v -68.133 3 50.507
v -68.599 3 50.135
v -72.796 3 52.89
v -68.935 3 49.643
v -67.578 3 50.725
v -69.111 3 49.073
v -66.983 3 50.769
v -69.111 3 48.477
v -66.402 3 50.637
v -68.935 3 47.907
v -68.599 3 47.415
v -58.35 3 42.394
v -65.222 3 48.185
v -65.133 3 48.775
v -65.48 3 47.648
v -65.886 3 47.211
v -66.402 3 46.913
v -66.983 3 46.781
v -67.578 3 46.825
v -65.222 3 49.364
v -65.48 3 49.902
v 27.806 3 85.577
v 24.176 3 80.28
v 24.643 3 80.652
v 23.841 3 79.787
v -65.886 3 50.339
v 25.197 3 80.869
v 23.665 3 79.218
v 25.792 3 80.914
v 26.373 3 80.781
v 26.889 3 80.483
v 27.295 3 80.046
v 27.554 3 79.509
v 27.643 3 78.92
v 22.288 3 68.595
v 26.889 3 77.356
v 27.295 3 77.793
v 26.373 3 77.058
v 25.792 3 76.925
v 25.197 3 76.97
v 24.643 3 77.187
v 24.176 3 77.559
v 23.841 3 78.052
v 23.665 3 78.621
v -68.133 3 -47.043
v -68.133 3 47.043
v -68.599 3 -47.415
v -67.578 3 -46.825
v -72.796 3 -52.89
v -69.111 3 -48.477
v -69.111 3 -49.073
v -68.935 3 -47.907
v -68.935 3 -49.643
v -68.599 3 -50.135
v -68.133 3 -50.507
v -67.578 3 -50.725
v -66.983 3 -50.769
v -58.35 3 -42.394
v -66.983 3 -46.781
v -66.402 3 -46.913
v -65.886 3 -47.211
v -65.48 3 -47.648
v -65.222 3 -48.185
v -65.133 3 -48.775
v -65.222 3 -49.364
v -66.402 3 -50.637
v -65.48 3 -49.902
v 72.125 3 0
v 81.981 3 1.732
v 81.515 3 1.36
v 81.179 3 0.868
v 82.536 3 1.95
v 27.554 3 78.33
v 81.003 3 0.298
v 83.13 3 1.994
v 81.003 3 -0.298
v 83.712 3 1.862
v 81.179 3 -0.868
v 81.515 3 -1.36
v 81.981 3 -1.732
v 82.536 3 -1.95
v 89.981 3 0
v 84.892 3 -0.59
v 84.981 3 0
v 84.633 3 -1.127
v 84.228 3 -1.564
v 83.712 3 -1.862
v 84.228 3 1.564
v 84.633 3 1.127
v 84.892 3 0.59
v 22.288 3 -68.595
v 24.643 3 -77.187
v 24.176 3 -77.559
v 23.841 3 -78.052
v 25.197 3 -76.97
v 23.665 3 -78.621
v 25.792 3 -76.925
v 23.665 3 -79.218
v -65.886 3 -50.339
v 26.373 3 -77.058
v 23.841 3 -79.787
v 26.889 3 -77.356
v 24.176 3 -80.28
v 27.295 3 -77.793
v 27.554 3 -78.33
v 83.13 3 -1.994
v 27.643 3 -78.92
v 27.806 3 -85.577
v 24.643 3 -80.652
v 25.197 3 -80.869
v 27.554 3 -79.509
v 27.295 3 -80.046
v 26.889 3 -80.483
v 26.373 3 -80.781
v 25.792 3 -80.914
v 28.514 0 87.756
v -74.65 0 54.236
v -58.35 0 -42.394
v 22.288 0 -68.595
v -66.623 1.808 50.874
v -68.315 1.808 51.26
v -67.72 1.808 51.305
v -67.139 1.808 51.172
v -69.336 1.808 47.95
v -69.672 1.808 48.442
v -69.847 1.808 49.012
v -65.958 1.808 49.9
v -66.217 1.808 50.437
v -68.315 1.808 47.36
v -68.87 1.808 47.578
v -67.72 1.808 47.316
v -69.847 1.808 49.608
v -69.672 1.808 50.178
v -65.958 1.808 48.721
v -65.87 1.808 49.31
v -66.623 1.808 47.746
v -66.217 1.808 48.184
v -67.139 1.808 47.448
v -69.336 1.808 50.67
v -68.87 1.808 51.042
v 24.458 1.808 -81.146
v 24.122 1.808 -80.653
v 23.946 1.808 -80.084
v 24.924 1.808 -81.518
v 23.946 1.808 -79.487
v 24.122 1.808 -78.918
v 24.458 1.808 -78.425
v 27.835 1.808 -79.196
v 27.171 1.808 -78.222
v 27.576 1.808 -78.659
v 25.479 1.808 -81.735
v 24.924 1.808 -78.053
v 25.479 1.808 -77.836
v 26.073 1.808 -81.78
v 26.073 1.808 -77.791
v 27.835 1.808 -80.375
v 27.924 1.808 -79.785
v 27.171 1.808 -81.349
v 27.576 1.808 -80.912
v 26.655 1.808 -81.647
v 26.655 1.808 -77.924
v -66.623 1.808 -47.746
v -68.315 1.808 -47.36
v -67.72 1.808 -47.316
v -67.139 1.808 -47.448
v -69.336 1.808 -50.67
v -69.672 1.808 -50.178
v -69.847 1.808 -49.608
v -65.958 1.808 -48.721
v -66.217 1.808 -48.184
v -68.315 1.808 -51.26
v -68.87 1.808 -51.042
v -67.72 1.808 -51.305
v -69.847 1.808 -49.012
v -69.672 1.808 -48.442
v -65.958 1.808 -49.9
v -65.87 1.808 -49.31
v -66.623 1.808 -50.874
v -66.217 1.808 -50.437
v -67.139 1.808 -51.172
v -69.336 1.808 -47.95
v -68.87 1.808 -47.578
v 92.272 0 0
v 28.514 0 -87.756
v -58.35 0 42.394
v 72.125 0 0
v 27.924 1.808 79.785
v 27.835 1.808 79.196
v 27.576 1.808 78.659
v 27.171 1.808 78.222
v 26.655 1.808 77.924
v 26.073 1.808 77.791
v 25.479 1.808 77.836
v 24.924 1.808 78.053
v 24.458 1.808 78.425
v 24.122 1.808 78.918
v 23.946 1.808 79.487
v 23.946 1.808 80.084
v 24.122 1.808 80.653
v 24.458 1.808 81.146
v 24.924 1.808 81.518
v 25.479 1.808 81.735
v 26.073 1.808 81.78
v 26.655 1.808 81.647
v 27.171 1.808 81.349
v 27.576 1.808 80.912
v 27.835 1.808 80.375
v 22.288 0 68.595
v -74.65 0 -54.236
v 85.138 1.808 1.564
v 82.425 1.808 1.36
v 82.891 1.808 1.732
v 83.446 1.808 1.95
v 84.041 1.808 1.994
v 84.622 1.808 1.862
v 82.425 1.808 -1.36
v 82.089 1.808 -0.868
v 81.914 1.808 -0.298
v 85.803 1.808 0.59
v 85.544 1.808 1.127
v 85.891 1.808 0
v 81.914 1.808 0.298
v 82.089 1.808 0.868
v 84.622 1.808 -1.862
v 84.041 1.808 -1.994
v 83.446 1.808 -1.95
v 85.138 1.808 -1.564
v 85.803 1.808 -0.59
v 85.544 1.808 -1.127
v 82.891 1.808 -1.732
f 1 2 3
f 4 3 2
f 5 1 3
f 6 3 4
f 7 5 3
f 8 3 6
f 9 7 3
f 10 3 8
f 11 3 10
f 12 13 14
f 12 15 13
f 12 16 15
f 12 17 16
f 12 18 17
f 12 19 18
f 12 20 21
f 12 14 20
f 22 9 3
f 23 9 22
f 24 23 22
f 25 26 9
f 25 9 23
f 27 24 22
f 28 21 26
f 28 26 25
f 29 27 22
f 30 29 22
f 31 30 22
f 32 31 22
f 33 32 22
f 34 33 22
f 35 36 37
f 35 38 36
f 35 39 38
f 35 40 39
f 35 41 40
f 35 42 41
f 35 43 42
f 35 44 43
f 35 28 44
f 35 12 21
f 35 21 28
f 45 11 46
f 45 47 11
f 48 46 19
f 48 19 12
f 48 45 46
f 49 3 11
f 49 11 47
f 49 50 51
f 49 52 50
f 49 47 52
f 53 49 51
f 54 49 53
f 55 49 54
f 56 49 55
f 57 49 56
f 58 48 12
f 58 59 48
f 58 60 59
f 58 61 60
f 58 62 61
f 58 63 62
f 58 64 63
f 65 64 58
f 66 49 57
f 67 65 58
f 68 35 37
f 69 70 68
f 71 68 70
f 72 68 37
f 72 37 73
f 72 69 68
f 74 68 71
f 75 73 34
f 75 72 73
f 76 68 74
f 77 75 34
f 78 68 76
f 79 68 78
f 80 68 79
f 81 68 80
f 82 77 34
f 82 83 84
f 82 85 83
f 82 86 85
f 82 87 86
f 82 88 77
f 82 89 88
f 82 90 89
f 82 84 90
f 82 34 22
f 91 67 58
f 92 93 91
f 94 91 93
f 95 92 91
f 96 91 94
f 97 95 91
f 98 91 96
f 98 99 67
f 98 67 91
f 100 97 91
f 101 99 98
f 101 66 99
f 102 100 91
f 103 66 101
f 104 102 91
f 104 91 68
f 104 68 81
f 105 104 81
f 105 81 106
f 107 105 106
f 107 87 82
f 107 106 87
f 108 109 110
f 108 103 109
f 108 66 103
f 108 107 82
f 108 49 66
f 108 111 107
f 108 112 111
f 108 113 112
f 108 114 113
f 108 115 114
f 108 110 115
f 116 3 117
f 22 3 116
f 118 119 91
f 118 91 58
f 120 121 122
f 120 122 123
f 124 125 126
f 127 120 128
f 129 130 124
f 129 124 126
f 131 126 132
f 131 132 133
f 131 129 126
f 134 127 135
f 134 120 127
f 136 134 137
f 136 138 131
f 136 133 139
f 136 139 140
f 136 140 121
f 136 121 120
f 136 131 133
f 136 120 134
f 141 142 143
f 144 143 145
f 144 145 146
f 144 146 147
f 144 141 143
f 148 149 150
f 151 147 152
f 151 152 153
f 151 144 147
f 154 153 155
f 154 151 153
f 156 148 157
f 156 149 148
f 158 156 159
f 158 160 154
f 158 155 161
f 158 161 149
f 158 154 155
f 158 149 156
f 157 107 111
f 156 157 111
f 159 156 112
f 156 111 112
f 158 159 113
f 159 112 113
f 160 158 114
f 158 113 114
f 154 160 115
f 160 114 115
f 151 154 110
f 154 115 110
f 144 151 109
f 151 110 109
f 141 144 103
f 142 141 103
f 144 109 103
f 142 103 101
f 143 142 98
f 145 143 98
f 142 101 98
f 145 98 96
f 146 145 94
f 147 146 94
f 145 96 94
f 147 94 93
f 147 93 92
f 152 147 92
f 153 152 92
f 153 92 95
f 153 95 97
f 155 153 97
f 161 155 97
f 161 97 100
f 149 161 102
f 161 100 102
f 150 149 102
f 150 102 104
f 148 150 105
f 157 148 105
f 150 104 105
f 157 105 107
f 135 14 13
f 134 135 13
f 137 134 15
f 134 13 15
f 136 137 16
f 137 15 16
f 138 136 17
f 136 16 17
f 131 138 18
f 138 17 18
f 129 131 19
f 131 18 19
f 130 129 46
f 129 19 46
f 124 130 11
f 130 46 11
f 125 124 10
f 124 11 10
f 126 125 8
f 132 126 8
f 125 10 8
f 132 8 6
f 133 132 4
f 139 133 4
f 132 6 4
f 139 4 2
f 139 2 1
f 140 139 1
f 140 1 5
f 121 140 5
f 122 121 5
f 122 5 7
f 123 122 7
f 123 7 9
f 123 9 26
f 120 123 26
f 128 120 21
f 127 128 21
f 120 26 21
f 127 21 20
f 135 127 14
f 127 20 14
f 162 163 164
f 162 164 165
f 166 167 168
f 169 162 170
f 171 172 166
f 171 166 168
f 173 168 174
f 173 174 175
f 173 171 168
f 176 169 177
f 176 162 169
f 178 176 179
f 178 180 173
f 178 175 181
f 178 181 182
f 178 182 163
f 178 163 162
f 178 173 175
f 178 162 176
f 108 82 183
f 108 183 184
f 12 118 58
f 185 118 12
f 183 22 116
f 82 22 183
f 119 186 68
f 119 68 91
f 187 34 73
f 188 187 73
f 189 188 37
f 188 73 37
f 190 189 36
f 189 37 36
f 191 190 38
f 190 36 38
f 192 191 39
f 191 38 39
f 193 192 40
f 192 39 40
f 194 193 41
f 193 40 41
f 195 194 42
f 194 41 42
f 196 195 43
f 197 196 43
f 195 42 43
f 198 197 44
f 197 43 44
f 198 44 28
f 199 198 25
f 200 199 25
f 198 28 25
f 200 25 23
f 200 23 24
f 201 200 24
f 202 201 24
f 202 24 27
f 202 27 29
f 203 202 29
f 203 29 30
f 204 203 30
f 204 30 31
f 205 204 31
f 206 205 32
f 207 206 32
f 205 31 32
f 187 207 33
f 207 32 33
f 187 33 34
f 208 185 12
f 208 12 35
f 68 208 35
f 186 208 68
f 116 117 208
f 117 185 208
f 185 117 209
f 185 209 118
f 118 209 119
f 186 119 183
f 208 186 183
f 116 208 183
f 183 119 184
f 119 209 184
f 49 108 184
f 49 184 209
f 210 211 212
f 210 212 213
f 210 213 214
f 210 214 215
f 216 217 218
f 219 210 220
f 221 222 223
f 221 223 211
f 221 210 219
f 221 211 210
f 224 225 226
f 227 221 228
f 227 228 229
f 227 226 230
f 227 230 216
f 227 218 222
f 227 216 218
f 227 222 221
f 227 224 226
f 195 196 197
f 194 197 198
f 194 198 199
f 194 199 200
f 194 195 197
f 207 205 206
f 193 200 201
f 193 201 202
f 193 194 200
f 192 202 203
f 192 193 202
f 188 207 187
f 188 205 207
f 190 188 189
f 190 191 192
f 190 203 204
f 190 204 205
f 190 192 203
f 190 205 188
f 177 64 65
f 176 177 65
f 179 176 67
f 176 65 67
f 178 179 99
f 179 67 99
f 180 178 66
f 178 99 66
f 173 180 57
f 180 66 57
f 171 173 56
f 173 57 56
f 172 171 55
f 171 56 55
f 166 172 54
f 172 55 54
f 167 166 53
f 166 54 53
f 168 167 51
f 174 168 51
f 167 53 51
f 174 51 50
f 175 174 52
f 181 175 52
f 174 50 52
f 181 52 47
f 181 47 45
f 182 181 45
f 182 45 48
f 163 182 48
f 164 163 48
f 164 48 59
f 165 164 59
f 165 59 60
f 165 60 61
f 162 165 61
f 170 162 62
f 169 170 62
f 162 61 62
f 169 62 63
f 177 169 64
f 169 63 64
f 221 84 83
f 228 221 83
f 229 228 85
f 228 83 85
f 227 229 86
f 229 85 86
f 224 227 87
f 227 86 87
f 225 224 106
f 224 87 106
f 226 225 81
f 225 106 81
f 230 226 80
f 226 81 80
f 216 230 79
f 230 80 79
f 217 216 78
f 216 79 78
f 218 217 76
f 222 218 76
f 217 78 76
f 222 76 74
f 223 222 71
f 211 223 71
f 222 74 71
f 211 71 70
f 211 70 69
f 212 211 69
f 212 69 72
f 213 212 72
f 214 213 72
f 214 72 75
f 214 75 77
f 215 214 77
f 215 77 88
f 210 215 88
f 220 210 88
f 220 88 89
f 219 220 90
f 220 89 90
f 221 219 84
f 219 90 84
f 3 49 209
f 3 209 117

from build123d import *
from OCP.BRepFilletAPI import BRepFilletAPI_MakeChamfer

# Parameters (mm, degrees)
BOSS_EXTRUDE1_DEPTH = 3
CHAMFER1_SIZE       = 3
CHAMFER1_SIZE_2     = 1.853922924
CUT_EXTRUDE1_DEPTH  = 10
SKETCH2_R           = 2
CUT_EXTRUDE2_DEPTH  = 1.5
SKETCH5_R           = 2
CUT_EXTRUDE3_DEPTH  = 1.5
SKETCH9_R           = 2
CUT_EXTRUDE4_DEPTH  = 1.5
SKETCH10_R          = 2
CUT_EXTRUDE5_DEPTH  = 1.5
SKETCH11_R          = 2
CUT_EXTRUDE6_DEPTH  = 1.5


with BuildPart() as part:
    # Sketch1 → Boss-Extrude1 (new body)
    with BuildSketch(Plane(origin=(0, 0, 0), x_dir=(1, 0, 0), z_dir=(0, 1, 0))):
        Polygon((92.27247452, 0), (28.51376274, 87.756338167), (-74.65, 54.236399716), (-74.65, -54.236399716), (28.51376274, -87.756338167), align=None)
    extrude(amount=BOSS_EXTRUDE1_DEPTH)

    # Chamfer1
    chamfer1_edges_1 = [part.edges().sort_by_distance(p)[0] for p in [
        (-74.65, 3, 0),
    ]]
    chamfer1_side_1 = [part.faces().sort_by_distance(p)[0] for p in [
        (-74.65, 2.962921542, 0),
    ]]
    chamfer1_edges_2 = [part.edges().sort_by_distance(p)[0] for p in [
        (-23.06811863, 3, -70.996368941),
    ]]
    chamfer1_side_2 = [part.faces().sort_by_distance(p)[0] for p in [
        (-23.06811863, 2.962921542, -70.996368941),
    ]]
    chamfer1_edges_3 = [part.edges().sort_by_distance(p)[0] for p in [
        (60.39311863, 3, -43.878169084),
    ]]
    chamfer1_side_3 = [part.faces().sort_by_distance(p)[0] for p in [
        (60.39311863, 2.962921542, -43.878169084),
    ]]
    chamfer1_edges_4 = [part.edges().sort_by_distance(p)[0] for p in [
        (60.39311863, 3, 43.878169084),
    ]]
    chamfer1_side_4 = [part.faces().sort_by_distance(p)[0] for p in [
        (60.39311863, 2.962921542, 43.878169084),
    ]]
    chamfer1_edges_5 = [part.edges().sort_by_distance(p)[0] for p in [
        (-23.06811863, 3, 70.996368941),
    ]]
    chamfer1_side_5 = [part.faces().sort_by_distance(p)[0] for p in [
        (-23.06811863, 2.962921542, 70.996368941),
    ]]
    chamfer1 = BRepFilletAPI_MakeChamfer(part.part.solid().wrapped)
    for e in chamfer1_edges_1:
        chamfer1.Add(CHAMFER1_SIZE - 0.0001, CHAMFER1_SIZE_2 - 0.0001, e.wrapped, chamfer1_side_1[0].wrapped)
    for e in chamfer1_edges_2:
        chamfer1.Add(CHAMFER1_SIZE - 0.0001, CHAMFER1_SIZE_2 - 0.0001, e.wrapped, chamfer1_side_2[0].wrapped)
    for e in chamfer1_edges_3:
        chamfer1.Add(CHAMFER1_SIZE - 0.0001, CHAMFER1_SIZE_2 - 0.0001, e.wrapped, chamfer1_side_3[0].wrapped)
    for e in chamfer1_edges_4:
        chamfer1.Add(CHAMFER1_SIZE - 0.0001, CHAMFER1_SIZE_2 - 0.0001, e.wrapped, chamfer1_side_4[0].wrapped)
    for e in chamfer1_edges_5:
        chamfer1.Add(CHAMFER1_SIZE - 0.0001, CHAMFER1_SIZE_2 - 0.0001, e.wrapped, chamfer1_side_5[0].wrapped)
    add(Compound.cast(chamfer1.Shape()), mode=Mode.REPLACE)  # a hair under: the kernel refuses the full size

    # 3DSketch1 → Cut-Extrude1 (cut)
    with BuildSketch(Plane(origin=(-58.35, 0, -42.393756509), x_dir=(0.9510565162951536, 0, 0.3090169943749475), z_dir=(0, -1, 0))):
        Polygon((0, 0), (26.200782433, 80.637716756), (110.988295452, 80.637716756), (137.189077885, 0), (68.594538943, -49.836849731), align=None)
    extrude(amount=-CUT_EXTRUDE1_DEPTH, mode=Mode.SUBTRACT)

    # Sketch2 → Cut-Extrude2 (cut, along a direction that is not the sketch's normal)
    with BuildSketch(Plane(origin=(0, 3, 0), x_dir=(1, 0, 0), z_dir=(0, 1, 0))):
        with Locations((-67.132958116, 48.774949102)):
            Circle(SKETCH2_R)
    extrude(amount=-CUT_EXTRUDE2_DEPTH, dir=(0.4910935234360901, 0.7946827516361096, 0.3568003300043147), mode=Mode.SUBTRACT)

    # Sketch5 → Cut-Extrude3 (cut, along a direction that is not the sketch's normal)
    with BuildSketch(Plane(origin=(0, 3, 0), x_dir=(1, 0, 0), z_dir=(0, 1, 0))):
        with Locations((25.642508235, 78.919525446)):
            Circle(SKETCH5_R)
    extrude(amount=-CUT_EXTRUDE3_DEPTH, dir=(-0.1875810342976446, 0.7946827516361096, 0.577315061144162), mode=Mode.SUBTRACT)

    # Sketch9 → Cut-Extrude4 (cut, along a direction that is not the sketch's normal)
    with BuildSketch(Plane(origin=(0, 3, 0), x_dir=(1, 0, 0), z_dir=(0, 1, 0))):
        with Locations((82.980899762, 0)):
            Circle(SKETCH9_R)
    extrude(amount=-CUT_EXTRUDE4_DEPTH, dir=(-0.6070249782768915, 0.7946827516361101, 3.1127032543975076e-15), mode=Mode.SUBTRACT)

    # Sketch10 → Cut-Extrude5 (cut, along a direction that is not the sketch's normal)
    with BuildSketch(Plane(origin=(0, 3, 0), x_dir=(1, 0, 0), z_dir=(0, 1, 0))):
        with Locations((25.642508235, -78.919525446)):
            Circle(SKETCH10_R)
    extrude(amount=-CUT_EXTRUDE5_DEPTH, dir=(-0.18758103429764075, 0.7946827516361107, -0.5773150611441616), mode=Mode.SUBTRACT)

    # Sketch11 → Cut-Extrude6 (cut, along a direction that is not the sketch's normal)
    with BuildSketch(Plane(origin=(0, 3, 0), x_dir=(1, 0, 0), z_dir=(0, 1, 0))):
        with Locations((-67.132958116, -48.774949102)):
            Circle(SKETCH11_R)
    extrude(amount=-CUT_EXTRUDE6_DEPTH, dir=(0.49109352343609003, 0.7946827516361095, -0.35680033000431516), mode=Mode.SUBTRACT)


solid = part.part
